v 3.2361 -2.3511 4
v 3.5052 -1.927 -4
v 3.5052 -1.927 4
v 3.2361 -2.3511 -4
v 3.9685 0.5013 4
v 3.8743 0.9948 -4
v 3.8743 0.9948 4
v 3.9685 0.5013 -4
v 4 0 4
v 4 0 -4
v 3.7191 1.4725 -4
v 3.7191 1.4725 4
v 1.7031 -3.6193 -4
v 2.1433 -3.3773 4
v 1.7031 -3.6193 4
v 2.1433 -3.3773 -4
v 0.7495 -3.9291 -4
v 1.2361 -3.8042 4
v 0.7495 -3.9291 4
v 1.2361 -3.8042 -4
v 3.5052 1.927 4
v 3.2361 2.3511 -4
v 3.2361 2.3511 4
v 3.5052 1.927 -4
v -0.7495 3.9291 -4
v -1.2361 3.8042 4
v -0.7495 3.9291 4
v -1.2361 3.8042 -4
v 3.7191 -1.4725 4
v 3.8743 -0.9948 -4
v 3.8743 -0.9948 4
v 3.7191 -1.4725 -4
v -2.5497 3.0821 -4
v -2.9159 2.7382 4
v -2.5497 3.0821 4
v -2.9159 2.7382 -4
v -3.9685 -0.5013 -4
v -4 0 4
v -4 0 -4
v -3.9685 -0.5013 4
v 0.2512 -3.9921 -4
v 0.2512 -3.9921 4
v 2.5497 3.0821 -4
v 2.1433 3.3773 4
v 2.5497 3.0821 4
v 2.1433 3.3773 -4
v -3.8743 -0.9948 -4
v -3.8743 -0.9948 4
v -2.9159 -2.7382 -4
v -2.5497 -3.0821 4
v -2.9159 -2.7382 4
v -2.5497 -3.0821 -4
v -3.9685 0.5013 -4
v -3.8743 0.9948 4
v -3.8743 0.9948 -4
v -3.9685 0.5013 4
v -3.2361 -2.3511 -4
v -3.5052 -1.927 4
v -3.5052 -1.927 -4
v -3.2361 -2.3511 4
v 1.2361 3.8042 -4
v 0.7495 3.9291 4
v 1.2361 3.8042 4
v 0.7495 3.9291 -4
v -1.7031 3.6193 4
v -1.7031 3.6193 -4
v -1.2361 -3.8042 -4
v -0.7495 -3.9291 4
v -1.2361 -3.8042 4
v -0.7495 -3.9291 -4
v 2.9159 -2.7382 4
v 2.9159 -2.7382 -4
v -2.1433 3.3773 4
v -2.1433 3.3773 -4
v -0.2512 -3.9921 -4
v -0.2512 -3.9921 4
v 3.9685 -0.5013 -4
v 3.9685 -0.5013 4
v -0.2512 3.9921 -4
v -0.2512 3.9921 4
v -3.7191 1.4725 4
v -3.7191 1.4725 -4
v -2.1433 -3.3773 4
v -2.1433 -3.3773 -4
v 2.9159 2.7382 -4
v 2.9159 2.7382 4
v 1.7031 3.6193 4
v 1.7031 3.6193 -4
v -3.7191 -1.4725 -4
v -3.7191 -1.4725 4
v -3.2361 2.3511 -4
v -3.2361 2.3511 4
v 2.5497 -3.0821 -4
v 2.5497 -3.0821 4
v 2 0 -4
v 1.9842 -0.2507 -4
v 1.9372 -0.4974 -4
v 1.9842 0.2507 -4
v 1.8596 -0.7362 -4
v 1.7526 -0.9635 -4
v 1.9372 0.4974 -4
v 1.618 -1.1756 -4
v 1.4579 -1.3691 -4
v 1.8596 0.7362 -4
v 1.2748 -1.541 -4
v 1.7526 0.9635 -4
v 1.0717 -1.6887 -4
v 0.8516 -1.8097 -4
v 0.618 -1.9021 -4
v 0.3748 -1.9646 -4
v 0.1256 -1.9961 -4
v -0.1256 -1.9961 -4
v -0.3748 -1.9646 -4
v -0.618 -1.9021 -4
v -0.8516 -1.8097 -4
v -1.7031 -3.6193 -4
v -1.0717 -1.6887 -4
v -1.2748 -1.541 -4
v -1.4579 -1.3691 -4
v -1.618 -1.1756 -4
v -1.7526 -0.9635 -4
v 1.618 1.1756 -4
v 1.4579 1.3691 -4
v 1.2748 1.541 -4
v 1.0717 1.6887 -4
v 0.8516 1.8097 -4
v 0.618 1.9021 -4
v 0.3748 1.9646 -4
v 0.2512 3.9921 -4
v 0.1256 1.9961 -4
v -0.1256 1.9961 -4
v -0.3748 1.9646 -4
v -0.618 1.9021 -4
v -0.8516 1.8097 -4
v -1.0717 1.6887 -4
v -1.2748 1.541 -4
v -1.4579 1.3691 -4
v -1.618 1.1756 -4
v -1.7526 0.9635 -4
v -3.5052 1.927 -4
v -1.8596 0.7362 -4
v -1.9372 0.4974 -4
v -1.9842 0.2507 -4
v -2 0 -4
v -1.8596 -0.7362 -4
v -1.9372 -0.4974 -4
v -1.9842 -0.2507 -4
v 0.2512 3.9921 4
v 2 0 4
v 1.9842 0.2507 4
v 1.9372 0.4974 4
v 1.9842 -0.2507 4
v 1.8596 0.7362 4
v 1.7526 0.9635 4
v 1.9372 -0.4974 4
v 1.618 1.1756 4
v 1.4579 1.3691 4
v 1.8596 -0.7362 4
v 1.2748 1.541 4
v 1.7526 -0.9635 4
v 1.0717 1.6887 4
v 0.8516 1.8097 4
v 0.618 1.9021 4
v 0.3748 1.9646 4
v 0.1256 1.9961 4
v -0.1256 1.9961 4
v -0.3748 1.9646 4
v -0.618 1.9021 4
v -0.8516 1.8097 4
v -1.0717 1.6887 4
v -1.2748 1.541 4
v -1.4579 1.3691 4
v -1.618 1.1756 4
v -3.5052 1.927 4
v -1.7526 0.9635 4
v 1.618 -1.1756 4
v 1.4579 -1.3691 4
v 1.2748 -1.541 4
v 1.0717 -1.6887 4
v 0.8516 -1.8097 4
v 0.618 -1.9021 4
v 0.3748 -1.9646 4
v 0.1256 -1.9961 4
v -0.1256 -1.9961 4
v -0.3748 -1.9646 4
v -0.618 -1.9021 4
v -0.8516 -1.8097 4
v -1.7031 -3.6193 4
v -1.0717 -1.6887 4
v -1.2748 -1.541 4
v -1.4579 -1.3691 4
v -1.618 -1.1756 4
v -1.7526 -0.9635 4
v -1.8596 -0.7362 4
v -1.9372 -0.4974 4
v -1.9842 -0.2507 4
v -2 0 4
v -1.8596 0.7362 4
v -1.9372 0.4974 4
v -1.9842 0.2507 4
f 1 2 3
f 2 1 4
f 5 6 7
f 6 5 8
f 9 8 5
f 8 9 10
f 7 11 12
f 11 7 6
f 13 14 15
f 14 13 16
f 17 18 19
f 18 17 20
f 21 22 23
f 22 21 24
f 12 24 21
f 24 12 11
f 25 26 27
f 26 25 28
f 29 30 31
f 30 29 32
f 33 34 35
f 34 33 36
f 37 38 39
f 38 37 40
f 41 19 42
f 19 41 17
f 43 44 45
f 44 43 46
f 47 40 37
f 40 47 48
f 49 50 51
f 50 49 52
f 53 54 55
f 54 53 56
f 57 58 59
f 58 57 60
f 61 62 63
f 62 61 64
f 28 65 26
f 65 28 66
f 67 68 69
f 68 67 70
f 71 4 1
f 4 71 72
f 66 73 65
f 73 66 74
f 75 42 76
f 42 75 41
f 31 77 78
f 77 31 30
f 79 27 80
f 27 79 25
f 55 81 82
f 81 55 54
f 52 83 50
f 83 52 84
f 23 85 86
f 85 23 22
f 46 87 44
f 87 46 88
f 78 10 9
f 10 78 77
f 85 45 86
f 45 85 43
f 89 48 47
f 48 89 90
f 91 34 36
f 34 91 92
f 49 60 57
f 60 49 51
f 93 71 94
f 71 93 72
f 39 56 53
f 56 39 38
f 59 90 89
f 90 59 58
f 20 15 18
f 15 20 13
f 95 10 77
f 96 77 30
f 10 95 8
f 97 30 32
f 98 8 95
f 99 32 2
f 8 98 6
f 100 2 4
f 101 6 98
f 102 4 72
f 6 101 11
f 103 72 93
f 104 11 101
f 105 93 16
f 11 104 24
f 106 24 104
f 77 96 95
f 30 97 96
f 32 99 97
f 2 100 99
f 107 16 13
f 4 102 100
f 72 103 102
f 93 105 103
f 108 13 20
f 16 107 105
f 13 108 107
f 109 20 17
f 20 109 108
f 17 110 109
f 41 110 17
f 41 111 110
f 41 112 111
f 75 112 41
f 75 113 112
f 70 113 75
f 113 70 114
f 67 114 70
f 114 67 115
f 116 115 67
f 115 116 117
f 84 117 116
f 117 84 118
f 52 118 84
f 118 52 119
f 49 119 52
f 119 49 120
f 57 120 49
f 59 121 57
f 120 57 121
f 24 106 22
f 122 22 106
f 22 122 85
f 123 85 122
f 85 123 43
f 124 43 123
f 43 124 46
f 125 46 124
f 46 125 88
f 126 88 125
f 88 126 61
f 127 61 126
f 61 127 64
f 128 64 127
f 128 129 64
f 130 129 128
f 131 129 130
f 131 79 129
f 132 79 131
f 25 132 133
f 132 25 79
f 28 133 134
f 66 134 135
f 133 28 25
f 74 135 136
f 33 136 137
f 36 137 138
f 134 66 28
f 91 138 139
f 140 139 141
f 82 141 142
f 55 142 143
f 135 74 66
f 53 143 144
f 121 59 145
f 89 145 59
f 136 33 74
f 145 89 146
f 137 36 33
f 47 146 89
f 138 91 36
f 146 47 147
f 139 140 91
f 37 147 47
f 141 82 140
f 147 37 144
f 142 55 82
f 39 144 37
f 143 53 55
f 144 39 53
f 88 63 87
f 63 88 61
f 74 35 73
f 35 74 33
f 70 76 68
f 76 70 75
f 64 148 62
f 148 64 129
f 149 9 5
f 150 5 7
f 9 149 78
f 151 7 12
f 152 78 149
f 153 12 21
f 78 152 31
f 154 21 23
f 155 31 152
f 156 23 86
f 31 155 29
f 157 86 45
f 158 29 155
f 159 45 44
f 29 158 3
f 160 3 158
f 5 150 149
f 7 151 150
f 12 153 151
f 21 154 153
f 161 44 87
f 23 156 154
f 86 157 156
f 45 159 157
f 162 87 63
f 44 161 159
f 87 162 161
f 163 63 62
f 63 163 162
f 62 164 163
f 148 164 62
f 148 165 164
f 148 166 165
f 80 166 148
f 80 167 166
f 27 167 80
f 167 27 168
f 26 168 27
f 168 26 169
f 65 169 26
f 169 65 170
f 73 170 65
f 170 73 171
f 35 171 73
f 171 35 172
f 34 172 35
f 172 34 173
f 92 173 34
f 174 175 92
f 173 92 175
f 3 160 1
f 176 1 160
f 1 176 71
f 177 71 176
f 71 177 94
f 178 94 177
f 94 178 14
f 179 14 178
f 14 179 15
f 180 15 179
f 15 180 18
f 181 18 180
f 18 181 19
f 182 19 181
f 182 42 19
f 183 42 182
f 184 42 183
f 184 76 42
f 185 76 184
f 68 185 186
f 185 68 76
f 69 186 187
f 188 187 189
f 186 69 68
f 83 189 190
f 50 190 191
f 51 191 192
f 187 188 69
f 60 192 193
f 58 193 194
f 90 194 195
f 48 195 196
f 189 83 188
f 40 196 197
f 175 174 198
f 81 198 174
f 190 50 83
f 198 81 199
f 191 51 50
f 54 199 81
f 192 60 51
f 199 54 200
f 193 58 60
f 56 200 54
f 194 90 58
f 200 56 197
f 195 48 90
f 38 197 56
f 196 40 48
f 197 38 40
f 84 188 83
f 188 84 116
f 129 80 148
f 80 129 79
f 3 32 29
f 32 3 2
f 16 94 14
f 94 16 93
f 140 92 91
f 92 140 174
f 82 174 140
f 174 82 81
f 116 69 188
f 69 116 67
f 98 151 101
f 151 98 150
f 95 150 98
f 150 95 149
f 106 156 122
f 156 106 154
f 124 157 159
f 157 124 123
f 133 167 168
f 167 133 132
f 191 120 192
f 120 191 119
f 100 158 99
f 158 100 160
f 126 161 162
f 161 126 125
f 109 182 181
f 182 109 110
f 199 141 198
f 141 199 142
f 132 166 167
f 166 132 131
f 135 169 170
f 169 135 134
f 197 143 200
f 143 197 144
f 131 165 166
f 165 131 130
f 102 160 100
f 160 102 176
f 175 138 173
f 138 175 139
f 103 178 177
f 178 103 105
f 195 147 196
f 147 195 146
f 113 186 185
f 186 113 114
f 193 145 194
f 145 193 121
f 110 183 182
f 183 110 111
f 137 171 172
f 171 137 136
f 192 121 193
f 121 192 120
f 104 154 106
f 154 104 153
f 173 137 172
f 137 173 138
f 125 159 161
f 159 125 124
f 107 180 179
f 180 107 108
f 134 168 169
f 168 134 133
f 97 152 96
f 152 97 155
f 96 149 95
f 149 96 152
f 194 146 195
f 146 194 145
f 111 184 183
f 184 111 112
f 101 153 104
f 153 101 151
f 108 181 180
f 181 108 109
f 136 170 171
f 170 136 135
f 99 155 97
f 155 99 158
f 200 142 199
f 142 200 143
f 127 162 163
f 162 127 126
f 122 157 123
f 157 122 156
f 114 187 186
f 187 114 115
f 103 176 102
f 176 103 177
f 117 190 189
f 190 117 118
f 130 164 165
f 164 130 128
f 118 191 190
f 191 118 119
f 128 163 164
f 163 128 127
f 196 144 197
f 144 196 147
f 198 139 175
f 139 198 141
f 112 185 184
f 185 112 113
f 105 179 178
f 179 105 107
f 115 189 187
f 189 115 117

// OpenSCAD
$fn = 50;


difference() {
	union() {
		translate(v = [0, 0, -4.0000000000]) {
			cylinder(h = 8, r = 4.0000000000);
		}
	}
	union() {
		translate(v = [0, 0, -100.0000000000]) {
			cylinder(h = 200, r = 2.0000000000);
		}
	}
}
